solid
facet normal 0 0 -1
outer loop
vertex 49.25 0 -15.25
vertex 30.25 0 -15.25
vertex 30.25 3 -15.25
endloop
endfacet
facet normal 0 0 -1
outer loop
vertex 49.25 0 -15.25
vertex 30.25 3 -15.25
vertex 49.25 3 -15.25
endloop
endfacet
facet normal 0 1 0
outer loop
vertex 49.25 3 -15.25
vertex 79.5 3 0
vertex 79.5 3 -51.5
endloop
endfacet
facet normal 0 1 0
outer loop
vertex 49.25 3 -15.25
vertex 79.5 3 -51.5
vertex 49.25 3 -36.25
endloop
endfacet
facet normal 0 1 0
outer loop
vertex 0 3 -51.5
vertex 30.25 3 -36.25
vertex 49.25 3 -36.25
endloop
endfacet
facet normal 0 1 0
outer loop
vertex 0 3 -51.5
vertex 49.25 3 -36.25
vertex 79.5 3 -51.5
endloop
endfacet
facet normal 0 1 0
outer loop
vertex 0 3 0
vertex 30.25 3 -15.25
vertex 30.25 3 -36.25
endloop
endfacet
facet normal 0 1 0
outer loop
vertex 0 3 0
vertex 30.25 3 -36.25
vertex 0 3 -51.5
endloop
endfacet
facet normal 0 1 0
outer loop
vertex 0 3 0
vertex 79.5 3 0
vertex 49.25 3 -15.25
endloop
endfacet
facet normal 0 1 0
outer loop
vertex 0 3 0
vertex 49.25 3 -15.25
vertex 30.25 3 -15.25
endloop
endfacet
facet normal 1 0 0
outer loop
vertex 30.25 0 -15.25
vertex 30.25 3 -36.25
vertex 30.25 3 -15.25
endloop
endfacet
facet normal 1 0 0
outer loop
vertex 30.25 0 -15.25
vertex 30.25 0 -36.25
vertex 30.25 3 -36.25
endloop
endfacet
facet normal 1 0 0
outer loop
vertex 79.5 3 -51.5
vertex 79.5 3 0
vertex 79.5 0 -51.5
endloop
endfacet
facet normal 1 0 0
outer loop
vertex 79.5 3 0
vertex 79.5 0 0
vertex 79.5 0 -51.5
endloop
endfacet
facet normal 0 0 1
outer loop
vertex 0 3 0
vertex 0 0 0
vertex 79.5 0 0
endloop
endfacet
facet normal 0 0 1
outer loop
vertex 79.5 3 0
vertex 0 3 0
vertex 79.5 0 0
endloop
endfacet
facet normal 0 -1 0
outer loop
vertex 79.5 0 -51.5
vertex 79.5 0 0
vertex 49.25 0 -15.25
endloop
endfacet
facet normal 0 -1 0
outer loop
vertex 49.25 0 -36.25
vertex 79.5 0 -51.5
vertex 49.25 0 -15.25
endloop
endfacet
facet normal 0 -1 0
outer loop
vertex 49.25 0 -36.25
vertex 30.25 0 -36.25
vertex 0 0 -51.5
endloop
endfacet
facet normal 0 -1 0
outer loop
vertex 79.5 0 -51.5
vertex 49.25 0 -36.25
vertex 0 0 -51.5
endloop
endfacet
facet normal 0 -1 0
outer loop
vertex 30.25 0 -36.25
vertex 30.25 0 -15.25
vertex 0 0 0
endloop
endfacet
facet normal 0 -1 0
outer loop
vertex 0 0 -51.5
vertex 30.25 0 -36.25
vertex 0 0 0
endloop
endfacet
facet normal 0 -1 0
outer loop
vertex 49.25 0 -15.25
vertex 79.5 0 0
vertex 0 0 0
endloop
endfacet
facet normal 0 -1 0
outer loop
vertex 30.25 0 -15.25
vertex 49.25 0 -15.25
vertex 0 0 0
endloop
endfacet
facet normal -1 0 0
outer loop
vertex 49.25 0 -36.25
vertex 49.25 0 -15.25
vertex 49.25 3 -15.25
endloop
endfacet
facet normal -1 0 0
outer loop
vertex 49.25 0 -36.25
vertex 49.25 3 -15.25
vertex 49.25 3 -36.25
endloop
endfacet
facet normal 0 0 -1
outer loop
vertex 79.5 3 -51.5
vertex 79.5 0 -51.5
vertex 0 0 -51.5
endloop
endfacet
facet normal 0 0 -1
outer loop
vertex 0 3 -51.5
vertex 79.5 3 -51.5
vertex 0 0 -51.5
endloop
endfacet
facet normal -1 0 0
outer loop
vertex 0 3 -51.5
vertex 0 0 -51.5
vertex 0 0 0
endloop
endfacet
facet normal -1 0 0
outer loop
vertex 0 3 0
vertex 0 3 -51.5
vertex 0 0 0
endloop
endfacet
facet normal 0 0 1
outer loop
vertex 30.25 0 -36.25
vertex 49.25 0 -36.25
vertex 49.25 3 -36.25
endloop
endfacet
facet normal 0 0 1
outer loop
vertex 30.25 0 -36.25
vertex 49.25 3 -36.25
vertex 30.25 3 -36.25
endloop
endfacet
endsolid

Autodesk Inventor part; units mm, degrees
ref_plane "YZ Plane" through (0, 0, 0) normal (1, 0, 0) x (0, 1, 0)
ref_plane "XZ Plane" through (0, 0, 0) normal (0, 1, 0) x (-1, 0, 0)
ref_plane "XY Plane" through (0, 0, 0) normal (0, 0, 1) x (1, 0, 0)
sketch "Skizze1" plane through (0, 0, 0) normal (0, 1, 0) x (-1, 0, 0)
  line L0 (0, 0) -> (-79.5, 0)
  line L1 (-79.5, 0) -> (-79.5, -51.5)
  line L2 (-79.5, -51.5) -> (0, -51.5)
  line L3 (0, -51.5) -> (0, 0)
  line L4 (-30.25, -15.25) -> (-49.25, -15.25)
  line L5 (-49.25, -15.25) -> (-49.25, -36.25)
  line L6 (-49.25, -36.25) -> (-30.25, -36.25)
  line L7 (-30.25, -36.25) -> (-30.25, -15.25)
  point P0 (-39.75, -36.25)
  point P1 (-39.75, -51.5)
  point P2 (-49.25, -25.75)
  point P3 (-79.5, -25.75)
  dimension "d0" = 79.5
  dimension "d1" = 51.5
  dimension "d4" = 21
  dimension "d5" = 19
extrude "Extrusion1" add sketch "Skizze1" along normal blind 3
properties part number "wood_front"
